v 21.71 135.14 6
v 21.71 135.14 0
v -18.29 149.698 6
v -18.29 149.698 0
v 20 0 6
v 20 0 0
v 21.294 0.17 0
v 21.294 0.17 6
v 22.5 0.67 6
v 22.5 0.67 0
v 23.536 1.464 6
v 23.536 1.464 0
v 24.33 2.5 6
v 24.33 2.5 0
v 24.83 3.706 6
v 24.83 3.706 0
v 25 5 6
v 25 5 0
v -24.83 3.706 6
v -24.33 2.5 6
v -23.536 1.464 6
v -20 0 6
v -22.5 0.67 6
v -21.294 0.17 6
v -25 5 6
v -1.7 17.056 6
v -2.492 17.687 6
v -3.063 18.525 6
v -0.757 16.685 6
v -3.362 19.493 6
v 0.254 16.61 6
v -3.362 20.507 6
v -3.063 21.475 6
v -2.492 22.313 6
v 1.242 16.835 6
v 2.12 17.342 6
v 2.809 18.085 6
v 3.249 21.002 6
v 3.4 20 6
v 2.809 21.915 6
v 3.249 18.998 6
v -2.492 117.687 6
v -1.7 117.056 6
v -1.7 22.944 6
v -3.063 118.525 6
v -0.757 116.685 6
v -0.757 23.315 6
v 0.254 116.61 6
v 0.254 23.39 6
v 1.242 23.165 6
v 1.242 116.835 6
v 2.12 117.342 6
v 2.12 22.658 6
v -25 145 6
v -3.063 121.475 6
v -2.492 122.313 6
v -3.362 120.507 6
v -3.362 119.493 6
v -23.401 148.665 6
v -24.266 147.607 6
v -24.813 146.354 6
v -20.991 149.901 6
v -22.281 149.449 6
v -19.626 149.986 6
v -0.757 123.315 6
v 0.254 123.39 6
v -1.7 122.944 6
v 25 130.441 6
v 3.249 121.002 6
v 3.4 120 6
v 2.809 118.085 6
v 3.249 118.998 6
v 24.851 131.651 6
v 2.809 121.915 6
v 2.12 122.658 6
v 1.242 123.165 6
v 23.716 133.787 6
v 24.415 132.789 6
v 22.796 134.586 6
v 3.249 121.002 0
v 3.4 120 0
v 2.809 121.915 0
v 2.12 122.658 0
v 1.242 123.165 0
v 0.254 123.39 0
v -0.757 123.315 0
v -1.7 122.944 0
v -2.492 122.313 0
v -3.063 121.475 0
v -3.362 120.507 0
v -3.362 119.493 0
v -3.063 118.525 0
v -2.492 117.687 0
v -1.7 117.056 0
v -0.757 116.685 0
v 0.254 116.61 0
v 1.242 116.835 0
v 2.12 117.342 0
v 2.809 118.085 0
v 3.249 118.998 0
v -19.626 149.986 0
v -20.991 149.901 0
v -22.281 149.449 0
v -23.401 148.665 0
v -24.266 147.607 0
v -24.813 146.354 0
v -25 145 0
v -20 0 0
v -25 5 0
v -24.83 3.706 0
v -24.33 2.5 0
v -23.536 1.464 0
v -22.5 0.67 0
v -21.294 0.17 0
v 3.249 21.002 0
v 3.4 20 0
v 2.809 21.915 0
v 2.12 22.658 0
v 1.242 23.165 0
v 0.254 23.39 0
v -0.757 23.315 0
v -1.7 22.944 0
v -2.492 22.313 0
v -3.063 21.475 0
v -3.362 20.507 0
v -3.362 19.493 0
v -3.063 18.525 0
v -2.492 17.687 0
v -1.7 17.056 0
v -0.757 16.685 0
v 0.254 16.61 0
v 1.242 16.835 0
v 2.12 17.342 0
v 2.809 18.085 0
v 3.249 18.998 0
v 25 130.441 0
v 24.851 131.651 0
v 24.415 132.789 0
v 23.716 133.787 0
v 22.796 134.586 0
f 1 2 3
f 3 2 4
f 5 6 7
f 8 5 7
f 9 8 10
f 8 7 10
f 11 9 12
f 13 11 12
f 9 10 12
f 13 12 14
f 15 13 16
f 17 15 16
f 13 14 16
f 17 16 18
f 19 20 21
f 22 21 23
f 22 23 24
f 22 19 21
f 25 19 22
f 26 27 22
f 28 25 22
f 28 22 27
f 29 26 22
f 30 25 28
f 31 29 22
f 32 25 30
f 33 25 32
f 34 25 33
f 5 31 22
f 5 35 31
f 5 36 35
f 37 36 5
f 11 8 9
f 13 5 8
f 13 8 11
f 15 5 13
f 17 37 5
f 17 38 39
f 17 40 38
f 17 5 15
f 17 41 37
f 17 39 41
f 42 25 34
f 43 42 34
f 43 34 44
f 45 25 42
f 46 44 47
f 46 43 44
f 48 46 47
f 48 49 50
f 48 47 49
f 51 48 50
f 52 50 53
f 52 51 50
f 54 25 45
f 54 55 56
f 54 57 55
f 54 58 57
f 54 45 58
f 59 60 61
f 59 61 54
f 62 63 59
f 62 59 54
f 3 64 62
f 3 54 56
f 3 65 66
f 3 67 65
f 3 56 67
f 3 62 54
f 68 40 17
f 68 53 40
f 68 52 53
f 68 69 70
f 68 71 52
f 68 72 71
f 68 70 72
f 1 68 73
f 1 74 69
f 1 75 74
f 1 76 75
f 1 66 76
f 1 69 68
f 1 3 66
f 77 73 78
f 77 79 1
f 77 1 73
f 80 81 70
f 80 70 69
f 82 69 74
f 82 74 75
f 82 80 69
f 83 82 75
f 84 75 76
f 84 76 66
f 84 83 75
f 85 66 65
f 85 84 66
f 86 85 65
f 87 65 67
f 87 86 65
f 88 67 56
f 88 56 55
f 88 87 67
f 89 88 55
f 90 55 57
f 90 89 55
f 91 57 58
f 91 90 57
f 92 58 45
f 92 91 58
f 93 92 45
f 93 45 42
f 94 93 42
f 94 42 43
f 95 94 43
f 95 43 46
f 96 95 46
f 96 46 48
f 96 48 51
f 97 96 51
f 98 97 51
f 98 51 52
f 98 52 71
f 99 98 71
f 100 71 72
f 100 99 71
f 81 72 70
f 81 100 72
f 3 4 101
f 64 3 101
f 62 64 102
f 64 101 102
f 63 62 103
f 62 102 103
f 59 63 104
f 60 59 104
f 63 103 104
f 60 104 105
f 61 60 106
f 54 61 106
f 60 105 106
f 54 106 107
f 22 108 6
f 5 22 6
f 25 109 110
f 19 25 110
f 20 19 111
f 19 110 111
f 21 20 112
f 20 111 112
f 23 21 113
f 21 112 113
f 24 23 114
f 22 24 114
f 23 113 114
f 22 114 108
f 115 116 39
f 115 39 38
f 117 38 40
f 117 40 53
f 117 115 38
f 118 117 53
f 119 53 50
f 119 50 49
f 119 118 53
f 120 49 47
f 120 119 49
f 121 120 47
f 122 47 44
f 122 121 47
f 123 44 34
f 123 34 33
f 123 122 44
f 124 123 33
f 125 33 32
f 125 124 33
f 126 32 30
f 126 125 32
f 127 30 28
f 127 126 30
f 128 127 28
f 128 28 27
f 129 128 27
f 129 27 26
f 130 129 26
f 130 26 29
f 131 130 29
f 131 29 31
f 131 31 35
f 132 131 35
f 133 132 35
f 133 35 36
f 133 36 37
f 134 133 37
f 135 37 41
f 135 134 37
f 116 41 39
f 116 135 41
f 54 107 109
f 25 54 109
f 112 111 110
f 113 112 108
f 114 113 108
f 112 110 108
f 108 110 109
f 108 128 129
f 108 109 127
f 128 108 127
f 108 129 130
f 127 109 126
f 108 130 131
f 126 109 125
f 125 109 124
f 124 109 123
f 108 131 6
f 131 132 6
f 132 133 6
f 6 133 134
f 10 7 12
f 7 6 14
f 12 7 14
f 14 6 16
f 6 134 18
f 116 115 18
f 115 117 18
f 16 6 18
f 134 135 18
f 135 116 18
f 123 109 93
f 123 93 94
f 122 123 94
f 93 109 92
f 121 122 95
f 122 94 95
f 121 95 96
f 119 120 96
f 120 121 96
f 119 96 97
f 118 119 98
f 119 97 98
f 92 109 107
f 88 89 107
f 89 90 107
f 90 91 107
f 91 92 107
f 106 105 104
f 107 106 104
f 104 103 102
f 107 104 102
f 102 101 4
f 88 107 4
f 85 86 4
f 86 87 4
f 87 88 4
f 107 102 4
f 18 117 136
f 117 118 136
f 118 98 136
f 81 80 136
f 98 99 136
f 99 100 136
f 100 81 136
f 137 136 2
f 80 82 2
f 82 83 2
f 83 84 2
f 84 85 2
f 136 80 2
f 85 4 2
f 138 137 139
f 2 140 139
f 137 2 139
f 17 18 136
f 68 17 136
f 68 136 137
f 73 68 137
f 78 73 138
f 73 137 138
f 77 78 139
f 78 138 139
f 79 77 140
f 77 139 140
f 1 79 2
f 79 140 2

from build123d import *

# Parameters (mm, degrees)
SKETCH1_R          = 3.4
BASE_EXTRUDE_DEPTH = 6


with BuildPart() as part:
    # Sketch1 → Base-Extrude (new body)
    with BuildSketch(Plane.XY):
        with BuildLine():
            Line((-20, 0), (20, 0))
            ThreePointArc((20, 0), (23.535533906, 1.464466094), (25, 5))
            Line((25, 5), (25, 130.441190629))
            ThreePointArc((25, 130.441190629), (24.095760221, 133.309072811), (21.710100717, 135.139653733))
            Line((21.710100717, 135.139653733), (-18.289899283, 149.698463104))
            ThreePointArc((-18.289899283, 149.698463104), (-22.867882182, 149.095760221), (-25, 145))
            Line((-25, 145), (-25, 5))
            ThreePointArc((-25, 5), (-23.535533906, 1.464466094), (-20, 0))
        make_face()
        with Locations((0, 120)):
            Circle(SKETCH1_R, mode=Mode.SUBTRACT)
        with Locations((0, 20)):
            Circle(SKETCH1_R, mode=Mode.SUBTRACT)
    extrude(amount=BASE_EXTRUDE_DEPTH)


solid = part.part
